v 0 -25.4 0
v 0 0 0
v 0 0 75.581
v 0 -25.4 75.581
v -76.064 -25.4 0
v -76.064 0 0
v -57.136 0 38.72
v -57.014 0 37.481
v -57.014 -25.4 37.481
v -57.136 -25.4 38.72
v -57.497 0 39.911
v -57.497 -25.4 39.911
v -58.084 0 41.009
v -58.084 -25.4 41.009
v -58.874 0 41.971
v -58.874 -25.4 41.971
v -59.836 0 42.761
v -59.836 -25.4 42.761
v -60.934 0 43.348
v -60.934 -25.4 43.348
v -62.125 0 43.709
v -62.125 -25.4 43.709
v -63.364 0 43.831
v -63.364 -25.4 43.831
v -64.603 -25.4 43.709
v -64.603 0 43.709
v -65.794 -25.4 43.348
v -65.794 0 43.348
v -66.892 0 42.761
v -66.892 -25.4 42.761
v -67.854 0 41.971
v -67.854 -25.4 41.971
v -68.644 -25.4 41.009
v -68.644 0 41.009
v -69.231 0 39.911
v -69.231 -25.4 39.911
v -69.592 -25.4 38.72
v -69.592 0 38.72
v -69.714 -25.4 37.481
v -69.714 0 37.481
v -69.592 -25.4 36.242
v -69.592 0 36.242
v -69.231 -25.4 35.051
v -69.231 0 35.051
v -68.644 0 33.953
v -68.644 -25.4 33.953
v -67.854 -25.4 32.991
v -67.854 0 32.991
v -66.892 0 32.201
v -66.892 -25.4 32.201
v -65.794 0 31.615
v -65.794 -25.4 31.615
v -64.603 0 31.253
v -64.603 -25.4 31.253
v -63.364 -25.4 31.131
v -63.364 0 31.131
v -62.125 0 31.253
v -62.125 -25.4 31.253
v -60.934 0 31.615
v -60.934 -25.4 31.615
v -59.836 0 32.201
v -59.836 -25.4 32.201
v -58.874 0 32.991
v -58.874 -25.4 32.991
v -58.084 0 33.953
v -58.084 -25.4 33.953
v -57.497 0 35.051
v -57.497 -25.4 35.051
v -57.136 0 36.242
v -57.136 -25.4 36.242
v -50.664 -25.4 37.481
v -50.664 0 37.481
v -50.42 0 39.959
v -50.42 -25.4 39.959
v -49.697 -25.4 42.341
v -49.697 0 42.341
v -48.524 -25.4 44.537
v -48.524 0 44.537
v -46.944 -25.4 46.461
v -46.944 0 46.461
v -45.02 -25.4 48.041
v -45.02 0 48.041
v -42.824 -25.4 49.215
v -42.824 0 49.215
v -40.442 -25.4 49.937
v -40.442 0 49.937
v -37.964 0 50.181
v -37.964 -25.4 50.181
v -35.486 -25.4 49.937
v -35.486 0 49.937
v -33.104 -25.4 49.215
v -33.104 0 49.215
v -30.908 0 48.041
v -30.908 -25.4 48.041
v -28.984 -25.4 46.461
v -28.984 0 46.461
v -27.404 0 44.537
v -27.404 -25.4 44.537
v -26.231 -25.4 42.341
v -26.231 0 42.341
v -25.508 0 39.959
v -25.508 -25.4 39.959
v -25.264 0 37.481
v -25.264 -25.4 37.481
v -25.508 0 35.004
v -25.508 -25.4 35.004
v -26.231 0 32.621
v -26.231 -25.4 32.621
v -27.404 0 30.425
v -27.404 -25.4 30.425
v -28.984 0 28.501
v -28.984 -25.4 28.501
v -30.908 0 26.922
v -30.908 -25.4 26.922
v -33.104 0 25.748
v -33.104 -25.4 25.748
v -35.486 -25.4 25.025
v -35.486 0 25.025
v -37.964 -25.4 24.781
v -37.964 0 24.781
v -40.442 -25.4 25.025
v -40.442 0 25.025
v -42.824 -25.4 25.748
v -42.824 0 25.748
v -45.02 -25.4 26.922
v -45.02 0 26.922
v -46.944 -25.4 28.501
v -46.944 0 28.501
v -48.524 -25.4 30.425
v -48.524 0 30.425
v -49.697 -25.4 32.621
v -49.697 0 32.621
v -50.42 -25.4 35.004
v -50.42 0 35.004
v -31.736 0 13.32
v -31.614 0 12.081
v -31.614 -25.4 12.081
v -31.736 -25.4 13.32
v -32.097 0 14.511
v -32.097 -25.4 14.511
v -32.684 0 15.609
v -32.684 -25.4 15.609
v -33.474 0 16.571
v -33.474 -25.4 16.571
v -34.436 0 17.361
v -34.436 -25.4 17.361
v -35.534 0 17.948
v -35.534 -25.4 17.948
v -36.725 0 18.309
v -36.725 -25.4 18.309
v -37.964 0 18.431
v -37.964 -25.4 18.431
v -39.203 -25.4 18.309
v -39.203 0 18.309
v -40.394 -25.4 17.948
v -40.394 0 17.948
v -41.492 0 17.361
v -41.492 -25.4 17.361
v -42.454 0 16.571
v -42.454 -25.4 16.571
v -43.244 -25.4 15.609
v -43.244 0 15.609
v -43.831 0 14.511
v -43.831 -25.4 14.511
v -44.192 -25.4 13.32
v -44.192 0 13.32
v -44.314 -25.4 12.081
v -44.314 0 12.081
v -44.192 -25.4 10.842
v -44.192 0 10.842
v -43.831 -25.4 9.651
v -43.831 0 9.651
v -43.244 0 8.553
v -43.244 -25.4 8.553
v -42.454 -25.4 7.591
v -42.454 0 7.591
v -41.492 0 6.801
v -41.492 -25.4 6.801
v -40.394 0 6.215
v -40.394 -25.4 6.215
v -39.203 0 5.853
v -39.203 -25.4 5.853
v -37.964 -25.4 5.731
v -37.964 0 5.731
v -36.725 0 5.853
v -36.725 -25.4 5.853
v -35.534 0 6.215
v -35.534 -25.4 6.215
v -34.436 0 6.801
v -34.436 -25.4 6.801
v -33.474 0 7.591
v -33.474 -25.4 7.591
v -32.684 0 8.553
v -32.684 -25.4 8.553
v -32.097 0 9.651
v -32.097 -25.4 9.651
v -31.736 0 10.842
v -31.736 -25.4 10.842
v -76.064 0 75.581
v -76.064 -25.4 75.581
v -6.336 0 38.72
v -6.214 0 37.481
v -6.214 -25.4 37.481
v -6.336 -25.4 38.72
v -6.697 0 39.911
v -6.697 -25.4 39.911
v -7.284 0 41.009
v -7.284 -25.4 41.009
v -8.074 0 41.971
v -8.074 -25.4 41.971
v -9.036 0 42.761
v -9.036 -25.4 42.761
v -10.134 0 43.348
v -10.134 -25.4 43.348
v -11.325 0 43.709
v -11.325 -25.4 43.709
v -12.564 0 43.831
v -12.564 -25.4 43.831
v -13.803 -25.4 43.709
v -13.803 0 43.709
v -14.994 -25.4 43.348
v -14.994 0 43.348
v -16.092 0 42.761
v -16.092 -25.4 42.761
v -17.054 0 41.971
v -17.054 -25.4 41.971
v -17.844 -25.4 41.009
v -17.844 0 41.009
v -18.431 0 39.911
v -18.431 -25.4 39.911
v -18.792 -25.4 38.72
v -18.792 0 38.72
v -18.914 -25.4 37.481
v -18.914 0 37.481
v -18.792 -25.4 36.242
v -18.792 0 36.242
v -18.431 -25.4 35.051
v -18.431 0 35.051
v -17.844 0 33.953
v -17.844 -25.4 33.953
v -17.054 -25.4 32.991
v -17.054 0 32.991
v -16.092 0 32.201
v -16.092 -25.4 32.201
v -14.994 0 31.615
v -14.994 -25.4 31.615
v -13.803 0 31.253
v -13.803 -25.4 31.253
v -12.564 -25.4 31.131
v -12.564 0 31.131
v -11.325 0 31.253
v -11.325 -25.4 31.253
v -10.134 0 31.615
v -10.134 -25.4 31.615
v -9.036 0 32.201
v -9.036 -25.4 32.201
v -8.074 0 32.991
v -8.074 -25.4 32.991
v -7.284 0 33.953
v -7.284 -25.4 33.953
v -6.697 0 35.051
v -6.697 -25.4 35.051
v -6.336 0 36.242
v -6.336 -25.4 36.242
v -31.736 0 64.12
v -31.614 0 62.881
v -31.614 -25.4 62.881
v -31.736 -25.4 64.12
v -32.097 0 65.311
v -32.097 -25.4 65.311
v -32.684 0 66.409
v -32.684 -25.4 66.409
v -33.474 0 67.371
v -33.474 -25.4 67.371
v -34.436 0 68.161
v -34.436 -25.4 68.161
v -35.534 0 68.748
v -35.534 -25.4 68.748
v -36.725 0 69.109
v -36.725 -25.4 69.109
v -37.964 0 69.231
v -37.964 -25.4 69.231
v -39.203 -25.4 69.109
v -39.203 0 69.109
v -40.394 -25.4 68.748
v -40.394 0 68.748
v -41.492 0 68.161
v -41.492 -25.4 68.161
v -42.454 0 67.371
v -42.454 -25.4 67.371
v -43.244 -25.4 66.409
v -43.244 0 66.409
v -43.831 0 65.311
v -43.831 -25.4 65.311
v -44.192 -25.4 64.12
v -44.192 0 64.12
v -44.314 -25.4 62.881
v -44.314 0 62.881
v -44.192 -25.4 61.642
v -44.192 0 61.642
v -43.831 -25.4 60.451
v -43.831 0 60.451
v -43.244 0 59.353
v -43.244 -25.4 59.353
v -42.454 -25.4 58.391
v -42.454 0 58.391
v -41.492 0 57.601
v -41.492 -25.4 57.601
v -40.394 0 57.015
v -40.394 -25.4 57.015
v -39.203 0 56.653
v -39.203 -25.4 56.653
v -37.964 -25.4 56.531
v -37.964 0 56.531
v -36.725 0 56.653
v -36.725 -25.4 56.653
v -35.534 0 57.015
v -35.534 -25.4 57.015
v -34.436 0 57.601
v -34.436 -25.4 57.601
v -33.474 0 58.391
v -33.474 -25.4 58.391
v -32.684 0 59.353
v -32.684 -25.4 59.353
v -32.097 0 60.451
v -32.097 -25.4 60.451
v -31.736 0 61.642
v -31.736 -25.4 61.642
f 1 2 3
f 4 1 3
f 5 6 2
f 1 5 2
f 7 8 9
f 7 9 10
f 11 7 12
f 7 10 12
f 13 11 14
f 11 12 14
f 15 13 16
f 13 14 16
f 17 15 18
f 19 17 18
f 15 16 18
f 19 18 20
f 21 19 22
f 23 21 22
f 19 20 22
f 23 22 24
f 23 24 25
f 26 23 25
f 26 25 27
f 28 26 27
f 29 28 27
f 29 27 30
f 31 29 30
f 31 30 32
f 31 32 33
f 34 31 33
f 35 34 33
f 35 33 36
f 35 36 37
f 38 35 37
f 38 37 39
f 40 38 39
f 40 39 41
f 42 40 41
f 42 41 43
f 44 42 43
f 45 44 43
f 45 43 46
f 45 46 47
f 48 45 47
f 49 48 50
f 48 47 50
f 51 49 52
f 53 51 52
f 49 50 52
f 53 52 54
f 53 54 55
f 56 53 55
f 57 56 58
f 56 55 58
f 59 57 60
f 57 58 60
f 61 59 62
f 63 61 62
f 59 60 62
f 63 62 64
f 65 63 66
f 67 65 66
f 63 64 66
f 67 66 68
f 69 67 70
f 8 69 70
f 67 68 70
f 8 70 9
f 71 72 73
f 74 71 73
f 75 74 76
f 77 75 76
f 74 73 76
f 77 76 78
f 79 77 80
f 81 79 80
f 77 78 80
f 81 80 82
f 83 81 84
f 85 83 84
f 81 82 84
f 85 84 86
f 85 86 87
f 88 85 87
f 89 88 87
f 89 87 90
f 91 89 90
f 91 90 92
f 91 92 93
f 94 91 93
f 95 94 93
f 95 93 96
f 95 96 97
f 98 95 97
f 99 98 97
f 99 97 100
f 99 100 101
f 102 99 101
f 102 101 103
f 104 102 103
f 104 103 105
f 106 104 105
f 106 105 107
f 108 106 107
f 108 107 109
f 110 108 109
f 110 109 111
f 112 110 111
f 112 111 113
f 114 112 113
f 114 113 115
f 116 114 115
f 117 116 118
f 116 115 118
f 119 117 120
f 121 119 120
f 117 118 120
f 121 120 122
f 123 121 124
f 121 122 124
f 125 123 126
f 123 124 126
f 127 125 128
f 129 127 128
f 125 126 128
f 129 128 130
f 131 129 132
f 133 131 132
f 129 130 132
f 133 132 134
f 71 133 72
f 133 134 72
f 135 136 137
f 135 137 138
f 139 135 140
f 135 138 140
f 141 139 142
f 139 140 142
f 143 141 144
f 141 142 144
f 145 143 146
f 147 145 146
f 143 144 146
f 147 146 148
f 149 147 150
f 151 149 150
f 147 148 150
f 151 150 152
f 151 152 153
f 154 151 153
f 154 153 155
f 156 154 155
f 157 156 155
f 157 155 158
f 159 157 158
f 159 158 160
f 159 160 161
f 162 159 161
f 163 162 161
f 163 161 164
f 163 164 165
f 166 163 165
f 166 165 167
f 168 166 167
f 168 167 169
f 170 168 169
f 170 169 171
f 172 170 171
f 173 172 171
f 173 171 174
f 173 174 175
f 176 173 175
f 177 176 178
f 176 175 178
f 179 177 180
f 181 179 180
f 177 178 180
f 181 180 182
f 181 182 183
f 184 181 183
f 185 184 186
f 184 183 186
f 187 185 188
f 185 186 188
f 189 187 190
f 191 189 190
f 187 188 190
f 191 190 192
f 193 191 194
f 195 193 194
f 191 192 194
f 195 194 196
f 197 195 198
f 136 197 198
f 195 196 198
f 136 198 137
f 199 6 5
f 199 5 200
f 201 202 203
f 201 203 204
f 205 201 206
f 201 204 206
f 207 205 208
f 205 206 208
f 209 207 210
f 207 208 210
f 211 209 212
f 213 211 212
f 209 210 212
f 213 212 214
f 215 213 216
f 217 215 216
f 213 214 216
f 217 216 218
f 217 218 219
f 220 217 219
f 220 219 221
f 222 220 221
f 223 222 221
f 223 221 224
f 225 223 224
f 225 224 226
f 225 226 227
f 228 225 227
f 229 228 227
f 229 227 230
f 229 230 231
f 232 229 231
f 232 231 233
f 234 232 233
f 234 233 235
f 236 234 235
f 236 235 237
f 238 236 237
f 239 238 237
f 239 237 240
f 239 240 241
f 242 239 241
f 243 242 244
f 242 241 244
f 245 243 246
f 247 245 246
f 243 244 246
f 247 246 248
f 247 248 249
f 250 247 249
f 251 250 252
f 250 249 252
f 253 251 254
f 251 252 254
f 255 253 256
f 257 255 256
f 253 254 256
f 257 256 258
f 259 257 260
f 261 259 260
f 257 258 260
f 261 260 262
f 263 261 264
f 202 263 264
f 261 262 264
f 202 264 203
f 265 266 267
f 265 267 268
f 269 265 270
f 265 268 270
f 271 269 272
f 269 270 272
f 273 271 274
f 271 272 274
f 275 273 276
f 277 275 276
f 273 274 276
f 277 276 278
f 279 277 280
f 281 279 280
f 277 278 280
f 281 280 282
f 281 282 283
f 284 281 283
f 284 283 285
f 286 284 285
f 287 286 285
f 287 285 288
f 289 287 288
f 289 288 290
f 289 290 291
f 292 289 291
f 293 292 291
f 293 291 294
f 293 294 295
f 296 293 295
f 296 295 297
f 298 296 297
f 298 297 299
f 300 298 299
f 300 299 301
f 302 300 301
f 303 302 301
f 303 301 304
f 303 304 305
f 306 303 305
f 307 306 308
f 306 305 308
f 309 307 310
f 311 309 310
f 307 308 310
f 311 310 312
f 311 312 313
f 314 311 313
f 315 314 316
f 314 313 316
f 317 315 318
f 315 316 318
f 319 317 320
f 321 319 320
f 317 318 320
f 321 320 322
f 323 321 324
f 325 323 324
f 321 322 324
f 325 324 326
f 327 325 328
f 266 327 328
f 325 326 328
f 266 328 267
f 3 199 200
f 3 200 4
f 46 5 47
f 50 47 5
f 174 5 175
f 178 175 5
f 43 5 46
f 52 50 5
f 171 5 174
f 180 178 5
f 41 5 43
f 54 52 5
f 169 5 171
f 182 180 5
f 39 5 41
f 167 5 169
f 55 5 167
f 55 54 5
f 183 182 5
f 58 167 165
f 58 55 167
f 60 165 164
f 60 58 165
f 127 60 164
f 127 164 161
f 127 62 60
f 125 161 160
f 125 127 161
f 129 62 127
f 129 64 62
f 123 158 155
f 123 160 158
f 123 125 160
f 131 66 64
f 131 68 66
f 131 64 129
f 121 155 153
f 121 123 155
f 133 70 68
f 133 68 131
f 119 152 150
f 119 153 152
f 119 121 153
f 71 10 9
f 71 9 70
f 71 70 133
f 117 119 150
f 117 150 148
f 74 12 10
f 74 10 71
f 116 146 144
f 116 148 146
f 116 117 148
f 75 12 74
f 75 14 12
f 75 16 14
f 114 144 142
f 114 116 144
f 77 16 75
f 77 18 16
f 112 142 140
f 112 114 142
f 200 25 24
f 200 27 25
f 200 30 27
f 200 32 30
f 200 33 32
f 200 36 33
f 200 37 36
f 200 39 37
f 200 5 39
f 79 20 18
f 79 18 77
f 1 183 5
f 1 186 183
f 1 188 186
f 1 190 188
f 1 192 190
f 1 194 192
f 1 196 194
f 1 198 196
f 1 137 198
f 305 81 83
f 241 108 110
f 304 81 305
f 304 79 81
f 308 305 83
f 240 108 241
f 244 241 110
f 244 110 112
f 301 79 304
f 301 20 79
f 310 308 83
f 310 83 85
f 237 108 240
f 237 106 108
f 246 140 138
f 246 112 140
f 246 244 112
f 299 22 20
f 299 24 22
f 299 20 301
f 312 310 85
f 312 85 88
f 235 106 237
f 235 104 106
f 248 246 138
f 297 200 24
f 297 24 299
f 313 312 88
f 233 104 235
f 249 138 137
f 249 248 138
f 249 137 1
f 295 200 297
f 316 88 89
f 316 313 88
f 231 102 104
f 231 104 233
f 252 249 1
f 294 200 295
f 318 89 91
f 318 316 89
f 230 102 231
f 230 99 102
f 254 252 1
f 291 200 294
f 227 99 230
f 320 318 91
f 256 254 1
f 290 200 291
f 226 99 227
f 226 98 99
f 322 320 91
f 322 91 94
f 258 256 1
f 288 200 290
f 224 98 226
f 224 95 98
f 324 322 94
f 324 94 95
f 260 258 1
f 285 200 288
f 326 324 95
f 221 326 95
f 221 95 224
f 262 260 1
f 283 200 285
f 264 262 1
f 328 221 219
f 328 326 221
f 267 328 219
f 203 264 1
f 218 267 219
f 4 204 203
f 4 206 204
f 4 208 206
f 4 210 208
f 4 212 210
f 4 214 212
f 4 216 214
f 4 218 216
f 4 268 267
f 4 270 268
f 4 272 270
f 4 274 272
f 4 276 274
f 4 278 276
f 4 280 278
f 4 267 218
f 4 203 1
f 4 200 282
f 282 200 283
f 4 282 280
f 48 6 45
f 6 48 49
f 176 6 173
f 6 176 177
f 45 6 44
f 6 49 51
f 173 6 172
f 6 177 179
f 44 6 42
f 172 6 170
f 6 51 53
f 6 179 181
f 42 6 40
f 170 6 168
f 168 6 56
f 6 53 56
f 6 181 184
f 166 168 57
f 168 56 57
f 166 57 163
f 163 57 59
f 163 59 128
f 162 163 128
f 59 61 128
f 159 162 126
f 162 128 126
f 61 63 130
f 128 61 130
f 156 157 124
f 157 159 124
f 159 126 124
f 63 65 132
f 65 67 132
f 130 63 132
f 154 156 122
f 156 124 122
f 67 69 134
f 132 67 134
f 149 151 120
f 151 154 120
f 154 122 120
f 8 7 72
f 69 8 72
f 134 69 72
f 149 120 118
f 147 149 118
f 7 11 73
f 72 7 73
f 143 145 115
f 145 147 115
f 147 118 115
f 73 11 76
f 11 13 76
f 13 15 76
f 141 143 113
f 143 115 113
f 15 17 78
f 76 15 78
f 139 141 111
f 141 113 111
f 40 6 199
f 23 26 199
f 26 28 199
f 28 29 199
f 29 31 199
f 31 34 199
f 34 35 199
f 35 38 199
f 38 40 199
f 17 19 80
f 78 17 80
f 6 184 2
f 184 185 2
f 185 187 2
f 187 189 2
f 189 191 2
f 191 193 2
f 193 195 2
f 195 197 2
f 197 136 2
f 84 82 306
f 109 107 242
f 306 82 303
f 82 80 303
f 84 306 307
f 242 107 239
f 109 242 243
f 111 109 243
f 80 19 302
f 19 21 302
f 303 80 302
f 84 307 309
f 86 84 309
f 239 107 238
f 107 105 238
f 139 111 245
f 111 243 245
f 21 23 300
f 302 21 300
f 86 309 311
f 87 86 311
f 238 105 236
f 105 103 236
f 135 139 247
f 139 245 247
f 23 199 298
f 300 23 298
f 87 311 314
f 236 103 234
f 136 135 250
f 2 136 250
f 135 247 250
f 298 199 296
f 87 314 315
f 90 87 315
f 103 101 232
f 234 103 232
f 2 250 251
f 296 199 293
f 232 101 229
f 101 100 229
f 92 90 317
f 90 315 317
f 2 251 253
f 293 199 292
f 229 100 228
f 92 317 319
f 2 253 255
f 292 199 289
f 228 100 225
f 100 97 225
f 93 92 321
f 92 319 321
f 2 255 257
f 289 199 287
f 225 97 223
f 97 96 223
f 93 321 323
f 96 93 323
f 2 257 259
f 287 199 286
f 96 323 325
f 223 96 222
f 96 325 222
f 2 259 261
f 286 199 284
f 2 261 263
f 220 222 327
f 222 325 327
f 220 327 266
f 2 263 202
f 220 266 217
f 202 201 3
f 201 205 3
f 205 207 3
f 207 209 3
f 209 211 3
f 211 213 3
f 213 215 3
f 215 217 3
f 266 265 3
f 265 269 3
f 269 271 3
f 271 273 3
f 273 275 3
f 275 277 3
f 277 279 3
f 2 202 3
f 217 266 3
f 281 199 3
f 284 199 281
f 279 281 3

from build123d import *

# Parameters (mm, degrees)
F0_W     = 76.064058
F0_H     = 75.58123
F1_DEPTH = 25.4
F2_R     = 12.7
F3_DEPTH = 25.401
F4_R     = 6.35
F5_DEPTH = 25.401


with BuildPart() as f1:
    # F0 (on Front) → F1 (new body)
    with BuildSketch(Plane.XZ):
        with Locations((-38.032029, 37.790615)):
            Rectangle(F0_W, F0_H)
    extrude(amount=F1_DEPTH)

    # F2 (on face) → F3 (cut, through all)
    with BuildSketch(Plane(origin=(0, 0, 0), x_dir=(-1, 0, 0), z_dir=(0, 1, 0))):
        with Locations((37.964058, 37.48123)):
            Circle(F2_R)
    extrude(amount=-F3_DEPTH, mode=Mode.SUBTRACT)

    # F4 (on face) → F5 (cut, through all)
    with BuildSketch(Plane.XZ.offset(25.4)):
        with Locations((-37.964058, 62.88123)):
            Circle(F4_R)
        with Locations((-63.364058, 37.48123)):
            Circle(F4_R)
        with Locations((-37.964058, 12.08123)):
            Circle(F4_R)
        with Locations((-12.564058, 37.48123)):
            Circle(F4_R)
    extrude(amount=-F5_DEPTH, mode=Mode.SUBTRACT)


solid = f1.part
